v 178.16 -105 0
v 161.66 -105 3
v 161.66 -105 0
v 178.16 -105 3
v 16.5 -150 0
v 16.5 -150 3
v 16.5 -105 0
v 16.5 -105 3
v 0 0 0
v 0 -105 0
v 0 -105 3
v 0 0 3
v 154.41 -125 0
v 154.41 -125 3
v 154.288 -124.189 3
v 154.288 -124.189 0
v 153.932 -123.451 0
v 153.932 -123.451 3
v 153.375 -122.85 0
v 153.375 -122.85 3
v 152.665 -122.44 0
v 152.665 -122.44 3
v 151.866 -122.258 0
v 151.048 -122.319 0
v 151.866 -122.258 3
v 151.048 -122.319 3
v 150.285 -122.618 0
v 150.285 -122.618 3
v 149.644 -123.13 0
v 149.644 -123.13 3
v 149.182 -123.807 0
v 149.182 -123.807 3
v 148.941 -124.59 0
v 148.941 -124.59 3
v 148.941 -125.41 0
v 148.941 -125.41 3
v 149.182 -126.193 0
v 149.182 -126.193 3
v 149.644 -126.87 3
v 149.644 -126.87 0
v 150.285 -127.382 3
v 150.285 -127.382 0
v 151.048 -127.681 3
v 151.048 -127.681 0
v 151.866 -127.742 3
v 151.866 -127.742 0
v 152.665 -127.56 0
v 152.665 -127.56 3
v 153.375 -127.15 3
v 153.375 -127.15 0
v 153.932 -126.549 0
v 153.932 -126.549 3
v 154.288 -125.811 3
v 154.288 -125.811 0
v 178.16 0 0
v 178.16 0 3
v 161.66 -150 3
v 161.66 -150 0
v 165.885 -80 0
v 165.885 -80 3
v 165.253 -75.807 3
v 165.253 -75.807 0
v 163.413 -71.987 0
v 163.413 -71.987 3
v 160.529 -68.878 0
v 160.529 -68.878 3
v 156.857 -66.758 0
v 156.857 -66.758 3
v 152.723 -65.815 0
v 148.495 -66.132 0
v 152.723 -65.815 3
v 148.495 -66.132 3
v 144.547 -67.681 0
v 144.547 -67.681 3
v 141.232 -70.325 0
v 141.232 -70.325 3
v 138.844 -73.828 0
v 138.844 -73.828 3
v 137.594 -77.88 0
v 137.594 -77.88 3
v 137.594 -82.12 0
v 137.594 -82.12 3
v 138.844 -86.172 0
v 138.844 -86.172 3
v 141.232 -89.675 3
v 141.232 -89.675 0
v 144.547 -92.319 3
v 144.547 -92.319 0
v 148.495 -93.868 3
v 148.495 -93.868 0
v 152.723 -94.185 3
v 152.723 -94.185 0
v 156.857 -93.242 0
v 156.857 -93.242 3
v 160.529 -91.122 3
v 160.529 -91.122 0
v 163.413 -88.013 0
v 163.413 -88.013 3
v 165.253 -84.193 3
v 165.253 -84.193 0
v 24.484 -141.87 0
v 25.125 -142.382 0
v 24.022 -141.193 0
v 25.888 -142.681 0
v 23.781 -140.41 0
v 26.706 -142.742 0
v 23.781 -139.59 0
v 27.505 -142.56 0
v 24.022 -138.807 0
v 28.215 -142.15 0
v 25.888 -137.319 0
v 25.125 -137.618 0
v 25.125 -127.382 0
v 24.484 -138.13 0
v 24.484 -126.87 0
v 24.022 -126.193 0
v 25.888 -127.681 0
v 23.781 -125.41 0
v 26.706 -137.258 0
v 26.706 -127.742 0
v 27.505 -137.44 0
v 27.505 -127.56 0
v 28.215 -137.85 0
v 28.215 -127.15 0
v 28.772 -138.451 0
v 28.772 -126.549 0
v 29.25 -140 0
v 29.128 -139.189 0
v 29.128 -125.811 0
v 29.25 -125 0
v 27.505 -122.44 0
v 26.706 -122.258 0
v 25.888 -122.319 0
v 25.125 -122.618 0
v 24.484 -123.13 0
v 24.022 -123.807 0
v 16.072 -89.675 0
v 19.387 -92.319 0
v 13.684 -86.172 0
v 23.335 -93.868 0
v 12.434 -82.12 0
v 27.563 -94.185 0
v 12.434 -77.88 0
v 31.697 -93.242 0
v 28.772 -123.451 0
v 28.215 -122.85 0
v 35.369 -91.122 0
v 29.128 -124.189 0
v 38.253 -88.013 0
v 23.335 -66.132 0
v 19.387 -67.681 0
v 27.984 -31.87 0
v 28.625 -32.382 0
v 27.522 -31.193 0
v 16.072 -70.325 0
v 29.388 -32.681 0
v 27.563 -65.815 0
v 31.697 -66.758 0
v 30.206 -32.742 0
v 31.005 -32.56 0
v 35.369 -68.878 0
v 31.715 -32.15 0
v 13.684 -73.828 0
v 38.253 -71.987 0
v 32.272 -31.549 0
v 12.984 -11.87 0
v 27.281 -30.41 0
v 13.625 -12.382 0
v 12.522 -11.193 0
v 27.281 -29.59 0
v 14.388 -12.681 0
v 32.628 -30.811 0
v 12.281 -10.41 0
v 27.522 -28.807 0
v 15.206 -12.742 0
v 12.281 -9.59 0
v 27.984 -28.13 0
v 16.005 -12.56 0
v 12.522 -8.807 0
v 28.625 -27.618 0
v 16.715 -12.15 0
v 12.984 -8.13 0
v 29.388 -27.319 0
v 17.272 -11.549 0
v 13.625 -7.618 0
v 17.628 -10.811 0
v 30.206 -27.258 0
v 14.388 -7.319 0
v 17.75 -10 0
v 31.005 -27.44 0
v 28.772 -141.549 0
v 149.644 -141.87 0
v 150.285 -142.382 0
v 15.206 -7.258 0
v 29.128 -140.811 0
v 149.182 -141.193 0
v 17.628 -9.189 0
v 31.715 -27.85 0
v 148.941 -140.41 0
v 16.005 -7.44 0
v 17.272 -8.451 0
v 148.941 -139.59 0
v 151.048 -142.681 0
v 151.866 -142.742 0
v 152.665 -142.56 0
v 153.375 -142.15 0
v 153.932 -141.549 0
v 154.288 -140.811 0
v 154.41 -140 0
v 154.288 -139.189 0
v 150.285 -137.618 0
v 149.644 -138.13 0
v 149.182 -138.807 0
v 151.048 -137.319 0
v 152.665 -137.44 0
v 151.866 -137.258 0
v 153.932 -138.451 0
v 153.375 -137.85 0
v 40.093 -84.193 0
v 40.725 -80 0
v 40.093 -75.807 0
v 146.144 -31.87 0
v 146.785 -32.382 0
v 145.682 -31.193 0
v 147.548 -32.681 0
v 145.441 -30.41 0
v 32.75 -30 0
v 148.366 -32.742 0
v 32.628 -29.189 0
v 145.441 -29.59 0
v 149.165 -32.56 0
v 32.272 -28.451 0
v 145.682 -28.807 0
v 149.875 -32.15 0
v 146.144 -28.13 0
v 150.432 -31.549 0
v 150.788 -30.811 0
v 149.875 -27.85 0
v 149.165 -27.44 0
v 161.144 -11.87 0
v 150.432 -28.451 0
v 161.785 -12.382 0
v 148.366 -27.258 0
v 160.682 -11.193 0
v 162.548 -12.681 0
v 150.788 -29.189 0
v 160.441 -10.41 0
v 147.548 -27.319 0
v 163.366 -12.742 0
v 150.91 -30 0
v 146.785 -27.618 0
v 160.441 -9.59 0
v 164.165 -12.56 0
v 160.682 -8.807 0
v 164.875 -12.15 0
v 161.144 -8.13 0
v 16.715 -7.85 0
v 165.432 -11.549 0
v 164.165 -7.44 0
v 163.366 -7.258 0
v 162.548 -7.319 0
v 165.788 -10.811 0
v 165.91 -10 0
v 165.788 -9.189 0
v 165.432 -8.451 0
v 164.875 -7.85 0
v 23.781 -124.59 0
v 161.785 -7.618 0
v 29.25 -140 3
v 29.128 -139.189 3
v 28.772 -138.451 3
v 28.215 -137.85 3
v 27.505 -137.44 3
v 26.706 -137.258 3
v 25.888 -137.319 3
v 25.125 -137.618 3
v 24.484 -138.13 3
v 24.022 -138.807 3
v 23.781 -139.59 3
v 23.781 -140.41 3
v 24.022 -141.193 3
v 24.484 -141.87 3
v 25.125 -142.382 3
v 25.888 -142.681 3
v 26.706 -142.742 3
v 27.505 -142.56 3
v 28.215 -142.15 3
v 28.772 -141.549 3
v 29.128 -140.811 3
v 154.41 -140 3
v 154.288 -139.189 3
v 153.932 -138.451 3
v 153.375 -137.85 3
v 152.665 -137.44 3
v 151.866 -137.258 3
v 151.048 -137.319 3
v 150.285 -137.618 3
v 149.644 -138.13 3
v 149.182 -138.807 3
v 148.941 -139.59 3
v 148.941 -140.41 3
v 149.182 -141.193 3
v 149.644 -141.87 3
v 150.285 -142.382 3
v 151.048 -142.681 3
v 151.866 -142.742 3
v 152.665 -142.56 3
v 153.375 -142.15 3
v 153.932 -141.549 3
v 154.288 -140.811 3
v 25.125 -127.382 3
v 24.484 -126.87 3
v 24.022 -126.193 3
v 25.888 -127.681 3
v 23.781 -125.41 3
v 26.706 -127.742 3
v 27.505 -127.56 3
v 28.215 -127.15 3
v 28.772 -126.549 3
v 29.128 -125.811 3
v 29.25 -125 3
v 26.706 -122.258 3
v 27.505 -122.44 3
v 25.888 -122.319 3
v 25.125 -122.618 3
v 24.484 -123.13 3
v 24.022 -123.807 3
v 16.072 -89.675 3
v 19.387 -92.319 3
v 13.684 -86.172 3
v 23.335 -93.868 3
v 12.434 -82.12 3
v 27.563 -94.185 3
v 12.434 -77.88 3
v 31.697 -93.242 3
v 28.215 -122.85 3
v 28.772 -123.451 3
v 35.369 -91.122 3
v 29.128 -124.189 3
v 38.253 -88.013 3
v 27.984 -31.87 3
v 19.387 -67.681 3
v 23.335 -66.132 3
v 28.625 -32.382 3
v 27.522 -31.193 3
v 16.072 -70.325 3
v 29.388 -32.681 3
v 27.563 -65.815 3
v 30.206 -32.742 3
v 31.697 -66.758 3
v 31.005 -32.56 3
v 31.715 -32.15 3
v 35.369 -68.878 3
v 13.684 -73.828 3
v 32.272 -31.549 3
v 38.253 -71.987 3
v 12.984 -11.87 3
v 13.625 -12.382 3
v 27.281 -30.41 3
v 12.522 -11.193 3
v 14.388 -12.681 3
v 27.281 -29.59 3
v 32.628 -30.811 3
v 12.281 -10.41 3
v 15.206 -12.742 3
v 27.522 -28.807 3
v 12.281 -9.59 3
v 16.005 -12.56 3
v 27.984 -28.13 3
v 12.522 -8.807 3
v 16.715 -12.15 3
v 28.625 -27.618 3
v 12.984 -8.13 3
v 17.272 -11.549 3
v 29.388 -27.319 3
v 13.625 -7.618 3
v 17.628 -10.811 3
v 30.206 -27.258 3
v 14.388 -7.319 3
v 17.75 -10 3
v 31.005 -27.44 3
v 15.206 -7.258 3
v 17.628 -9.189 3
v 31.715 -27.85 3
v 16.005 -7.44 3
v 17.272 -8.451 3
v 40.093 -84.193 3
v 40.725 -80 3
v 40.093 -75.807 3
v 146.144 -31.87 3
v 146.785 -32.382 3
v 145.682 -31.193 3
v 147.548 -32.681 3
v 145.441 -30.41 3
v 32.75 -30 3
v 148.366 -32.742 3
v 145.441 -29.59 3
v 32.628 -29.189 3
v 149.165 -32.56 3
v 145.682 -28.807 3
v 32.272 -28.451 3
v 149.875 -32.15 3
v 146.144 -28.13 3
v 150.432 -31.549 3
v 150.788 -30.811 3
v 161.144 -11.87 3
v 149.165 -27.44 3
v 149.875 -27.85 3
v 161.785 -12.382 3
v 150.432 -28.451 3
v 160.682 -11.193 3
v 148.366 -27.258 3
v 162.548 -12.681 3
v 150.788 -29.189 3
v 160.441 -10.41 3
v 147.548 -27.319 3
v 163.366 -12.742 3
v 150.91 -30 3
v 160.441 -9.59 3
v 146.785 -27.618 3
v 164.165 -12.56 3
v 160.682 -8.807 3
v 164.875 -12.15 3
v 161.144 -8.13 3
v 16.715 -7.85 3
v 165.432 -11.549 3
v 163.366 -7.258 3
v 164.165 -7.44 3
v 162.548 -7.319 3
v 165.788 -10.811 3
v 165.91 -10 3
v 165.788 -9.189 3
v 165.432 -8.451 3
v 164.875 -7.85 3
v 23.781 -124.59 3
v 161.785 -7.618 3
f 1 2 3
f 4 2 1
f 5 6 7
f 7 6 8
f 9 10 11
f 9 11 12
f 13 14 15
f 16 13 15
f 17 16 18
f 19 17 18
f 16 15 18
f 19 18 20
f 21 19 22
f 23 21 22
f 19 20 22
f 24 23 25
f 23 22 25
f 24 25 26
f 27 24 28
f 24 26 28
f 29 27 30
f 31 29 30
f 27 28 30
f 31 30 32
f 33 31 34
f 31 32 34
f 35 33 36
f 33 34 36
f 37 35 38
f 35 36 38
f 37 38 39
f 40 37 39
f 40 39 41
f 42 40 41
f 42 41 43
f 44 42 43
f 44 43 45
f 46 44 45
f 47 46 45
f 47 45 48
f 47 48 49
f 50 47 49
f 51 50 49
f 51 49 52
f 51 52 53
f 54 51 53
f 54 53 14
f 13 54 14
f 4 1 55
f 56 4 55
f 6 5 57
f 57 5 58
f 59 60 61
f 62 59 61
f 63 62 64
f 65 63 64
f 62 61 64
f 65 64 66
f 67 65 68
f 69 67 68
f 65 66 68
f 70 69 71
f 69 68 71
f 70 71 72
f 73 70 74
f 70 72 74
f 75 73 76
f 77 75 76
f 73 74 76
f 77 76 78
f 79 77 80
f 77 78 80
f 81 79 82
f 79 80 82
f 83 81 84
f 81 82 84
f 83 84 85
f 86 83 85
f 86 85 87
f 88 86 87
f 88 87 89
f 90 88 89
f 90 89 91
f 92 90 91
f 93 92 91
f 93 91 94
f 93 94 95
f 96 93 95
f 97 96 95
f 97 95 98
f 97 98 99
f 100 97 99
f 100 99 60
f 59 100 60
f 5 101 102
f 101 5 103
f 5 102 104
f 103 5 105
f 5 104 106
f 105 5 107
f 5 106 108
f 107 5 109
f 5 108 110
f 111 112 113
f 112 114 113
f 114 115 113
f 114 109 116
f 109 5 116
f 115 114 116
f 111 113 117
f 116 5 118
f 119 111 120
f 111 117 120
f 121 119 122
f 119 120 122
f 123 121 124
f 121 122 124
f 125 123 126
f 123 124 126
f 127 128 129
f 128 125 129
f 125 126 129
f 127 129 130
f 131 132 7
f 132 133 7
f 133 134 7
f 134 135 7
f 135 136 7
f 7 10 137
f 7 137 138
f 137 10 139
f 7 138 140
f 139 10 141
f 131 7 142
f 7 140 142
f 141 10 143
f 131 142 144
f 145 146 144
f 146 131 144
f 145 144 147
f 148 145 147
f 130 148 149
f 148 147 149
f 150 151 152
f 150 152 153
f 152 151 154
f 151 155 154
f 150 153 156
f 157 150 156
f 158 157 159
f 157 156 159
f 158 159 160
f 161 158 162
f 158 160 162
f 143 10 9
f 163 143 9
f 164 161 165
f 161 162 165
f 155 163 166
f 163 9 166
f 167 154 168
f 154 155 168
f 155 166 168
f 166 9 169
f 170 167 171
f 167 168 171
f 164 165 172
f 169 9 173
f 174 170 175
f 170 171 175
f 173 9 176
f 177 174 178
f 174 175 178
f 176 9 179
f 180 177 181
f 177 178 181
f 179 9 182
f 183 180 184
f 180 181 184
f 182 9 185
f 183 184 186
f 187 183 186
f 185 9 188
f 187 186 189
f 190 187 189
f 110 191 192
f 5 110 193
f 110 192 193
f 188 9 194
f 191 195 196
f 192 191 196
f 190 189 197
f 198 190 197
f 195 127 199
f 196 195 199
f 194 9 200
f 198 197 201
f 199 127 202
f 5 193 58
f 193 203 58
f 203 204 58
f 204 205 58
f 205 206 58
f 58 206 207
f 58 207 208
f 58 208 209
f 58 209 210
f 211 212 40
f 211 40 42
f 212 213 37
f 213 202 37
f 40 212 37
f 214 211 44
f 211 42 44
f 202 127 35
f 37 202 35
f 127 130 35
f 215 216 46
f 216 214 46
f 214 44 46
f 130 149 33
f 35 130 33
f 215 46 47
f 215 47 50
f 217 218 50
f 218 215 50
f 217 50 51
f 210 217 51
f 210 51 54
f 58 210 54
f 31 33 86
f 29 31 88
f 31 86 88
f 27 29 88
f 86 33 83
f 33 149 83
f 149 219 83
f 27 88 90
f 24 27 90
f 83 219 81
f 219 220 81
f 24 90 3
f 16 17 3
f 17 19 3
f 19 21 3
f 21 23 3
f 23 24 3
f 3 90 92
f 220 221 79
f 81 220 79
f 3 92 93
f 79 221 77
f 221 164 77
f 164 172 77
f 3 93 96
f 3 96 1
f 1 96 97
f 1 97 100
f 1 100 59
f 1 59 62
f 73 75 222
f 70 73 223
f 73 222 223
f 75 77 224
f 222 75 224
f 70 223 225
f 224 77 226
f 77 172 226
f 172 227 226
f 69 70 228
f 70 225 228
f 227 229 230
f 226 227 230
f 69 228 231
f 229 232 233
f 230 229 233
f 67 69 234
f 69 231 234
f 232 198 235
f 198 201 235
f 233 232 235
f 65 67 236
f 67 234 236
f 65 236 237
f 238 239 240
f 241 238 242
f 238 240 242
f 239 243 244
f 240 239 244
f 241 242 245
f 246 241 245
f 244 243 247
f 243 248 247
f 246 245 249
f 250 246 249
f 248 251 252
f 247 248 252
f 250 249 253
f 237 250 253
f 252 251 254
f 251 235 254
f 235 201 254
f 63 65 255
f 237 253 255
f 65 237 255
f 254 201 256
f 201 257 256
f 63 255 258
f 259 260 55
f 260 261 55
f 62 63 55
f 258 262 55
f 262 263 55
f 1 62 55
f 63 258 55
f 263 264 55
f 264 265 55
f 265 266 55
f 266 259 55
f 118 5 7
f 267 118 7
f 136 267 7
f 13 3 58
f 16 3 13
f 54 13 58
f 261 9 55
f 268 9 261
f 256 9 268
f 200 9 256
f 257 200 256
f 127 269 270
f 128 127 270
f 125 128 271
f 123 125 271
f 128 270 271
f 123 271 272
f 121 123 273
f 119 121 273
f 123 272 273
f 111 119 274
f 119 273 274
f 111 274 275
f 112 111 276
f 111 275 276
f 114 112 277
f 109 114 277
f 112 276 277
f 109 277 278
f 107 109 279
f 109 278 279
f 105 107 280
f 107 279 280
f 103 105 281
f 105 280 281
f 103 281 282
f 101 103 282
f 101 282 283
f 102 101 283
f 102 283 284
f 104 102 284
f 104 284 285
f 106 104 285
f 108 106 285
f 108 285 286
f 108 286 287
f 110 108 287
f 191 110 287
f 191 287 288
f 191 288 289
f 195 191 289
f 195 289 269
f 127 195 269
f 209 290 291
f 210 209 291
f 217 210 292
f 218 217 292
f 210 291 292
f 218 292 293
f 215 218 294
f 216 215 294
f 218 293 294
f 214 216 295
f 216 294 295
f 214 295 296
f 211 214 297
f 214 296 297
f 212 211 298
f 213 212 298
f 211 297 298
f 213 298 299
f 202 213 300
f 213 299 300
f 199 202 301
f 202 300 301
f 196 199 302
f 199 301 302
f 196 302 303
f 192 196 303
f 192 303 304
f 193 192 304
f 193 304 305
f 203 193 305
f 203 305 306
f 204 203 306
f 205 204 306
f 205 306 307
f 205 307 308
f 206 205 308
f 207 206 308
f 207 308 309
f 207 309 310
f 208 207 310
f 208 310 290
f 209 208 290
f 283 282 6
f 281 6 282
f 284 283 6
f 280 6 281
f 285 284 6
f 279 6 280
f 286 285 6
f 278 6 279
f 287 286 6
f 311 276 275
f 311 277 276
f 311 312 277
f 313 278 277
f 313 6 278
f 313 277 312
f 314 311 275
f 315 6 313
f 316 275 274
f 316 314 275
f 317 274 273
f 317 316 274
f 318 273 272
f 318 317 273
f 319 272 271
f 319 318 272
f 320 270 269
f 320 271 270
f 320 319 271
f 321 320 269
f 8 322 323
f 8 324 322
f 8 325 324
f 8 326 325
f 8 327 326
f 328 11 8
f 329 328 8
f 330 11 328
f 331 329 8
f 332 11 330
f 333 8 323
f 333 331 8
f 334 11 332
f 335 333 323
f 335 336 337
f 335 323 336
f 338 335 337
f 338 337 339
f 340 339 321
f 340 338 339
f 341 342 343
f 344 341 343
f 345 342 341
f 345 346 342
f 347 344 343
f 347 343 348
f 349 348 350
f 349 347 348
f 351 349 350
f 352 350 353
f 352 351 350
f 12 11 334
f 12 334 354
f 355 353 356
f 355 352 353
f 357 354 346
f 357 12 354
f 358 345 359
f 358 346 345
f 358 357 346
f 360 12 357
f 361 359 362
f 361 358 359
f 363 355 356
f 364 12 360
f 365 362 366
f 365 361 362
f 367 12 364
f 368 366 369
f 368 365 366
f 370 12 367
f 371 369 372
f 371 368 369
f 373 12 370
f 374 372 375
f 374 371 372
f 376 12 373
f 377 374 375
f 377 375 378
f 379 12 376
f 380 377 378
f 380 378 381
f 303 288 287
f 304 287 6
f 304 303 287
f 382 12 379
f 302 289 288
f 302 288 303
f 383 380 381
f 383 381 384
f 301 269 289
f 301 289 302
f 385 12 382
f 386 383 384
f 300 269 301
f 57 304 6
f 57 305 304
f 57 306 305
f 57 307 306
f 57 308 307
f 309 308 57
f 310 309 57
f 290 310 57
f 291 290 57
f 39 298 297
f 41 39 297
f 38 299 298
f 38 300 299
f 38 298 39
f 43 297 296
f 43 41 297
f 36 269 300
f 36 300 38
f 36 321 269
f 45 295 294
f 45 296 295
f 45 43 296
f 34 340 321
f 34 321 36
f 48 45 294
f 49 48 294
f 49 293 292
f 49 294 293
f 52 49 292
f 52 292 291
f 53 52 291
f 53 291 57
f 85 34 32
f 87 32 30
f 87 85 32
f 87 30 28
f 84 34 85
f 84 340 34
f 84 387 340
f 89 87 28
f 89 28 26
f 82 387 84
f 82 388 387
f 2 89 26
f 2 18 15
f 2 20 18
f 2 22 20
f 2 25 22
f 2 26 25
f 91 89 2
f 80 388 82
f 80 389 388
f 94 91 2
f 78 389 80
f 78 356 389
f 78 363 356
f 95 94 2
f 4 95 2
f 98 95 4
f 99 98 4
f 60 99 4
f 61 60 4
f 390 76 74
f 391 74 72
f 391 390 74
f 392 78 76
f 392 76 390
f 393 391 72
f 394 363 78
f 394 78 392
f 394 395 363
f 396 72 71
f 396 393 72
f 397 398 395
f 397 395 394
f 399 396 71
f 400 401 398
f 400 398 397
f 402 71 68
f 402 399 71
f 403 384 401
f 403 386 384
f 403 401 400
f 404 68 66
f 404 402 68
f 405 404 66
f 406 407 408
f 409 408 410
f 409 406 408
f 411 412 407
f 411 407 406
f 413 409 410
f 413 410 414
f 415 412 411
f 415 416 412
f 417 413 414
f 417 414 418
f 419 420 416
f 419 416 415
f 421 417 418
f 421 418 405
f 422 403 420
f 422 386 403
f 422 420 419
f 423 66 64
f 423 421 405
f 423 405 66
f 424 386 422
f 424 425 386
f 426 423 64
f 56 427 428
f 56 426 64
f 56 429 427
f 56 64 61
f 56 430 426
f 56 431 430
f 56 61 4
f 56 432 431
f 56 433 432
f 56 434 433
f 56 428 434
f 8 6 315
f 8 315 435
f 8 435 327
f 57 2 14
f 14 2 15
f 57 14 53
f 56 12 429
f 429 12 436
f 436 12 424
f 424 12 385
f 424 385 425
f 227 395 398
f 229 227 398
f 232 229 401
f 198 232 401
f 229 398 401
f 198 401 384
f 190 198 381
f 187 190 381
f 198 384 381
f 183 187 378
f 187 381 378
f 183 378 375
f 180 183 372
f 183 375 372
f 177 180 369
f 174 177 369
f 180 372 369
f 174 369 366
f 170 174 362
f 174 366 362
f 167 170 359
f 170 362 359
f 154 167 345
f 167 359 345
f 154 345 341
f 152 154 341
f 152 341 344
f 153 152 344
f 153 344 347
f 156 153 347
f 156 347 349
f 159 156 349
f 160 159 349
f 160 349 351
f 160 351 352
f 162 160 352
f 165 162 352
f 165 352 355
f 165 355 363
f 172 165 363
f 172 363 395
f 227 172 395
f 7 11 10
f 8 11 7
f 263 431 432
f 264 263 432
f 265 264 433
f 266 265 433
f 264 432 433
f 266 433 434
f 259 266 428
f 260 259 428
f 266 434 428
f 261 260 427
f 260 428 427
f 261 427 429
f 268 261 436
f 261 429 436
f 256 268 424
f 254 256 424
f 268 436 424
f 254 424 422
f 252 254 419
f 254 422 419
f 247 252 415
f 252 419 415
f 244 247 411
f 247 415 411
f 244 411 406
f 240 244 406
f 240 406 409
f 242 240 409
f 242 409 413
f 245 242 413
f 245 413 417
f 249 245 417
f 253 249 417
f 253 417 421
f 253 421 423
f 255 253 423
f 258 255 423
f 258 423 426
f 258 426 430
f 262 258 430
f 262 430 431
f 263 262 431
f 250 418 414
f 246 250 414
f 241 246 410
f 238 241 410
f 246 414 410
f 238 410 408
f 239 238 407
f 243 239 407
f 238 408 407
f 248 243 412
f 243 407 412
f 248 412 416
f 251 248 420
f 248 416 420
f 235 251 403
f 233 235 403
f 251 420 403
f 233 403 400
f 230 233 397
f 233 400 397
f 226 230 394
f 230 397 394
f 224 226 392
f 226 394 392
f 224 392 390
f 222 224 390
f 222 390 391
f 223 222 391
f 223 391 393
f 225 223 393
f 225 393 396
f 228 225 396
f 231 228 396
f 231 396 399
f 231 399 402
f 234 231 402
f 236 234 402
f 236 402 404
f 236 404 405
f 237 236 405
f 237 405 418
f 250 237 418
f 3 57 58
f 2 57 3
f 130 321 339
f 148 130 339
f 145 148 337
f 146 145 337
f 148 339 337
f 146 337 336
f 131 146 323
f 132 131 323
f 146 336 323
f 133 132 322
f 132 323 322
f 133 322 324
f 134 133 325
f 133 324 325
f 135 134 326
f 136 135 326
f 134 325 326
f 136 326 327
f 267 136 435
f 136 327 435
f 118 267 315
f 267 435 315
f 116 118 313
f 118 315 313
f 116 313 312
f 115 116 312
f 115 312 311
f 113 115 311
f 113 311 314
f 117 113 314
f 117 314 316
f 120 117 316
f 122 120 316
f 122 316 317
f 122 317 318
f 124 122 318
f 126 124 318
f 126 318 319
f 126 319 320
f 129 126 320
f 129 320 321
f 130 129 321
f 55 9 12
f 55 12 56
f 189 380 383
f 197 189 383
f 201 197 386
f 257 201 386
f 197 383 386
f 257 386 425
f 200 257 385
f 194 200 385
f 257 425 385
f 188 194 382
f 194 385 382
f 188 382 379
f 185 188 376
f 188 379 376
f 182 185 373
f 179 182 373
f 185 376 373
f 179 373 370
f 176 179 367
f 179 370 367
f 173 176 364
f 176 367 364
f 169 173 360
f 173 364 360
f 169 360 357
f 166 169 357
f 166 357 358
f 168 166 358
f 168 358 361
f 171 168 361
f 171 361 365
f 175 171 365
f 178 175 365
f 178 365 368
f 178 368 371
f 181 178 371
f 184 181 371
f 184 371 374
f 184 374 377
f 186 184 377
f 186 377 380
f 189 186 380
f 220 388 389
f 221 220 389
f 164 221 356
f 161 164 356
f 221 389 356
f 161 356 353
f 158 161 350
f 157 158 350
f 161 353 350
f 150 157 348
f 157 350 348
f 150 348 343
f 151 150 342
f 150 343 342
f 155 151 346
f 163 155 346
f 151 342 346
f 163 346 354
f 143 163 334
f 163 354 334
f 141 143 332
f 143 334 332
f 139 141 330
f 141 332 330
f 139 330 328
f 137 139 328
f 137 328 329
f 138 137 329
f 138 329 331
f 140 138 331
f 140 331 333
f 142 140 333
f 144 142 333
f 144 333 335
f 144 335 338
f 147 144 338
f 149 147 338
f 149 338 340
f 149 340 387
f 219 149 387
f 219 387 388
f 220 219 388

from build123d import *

# Parameters (mm, degrees)
SKETCH1_W           = 178.16
SKETCH1_H           = 150
BOSS_EXTRUDE1_DEPTH = 3
SKETCH2_R           = 14.225
SKETCH2_R_2         = 2.75
CUT_EXTRUDE1_DEPTH  = 4
SKETCH4_W           = 16.5
SKETCH4_H           = 45
CUT_EXTRUDE3_DEPTH  = 4
SKETCH5_R           = 2.75
CUT_EXTRUDE4_DEPTH  = 4


with BuildPart() as part:
    # Sketch1 → Boss-Extrude1 (new body)
    with BuildSketch(Plane.XY):
        with Locations((89.08, -75)):
            Rectangle(SKETCH1_W, SKETCH1_H)
    extrude(amount=BOSS_EXTRUDE1_DEPTH)

    # Sketch2 → Cut-Extrude1 (cut, through all)
    with BuildSketch(Plane.XY.offset(3)):
        with Locations((26.5, -80)):
            Circle(SKETCH2_R)
        with Locations((151.66, -80)):
            Circle(SKETCH2_R)
        with Locations((26.5, -140)):
            Circle(SKETCH2_R_2)
        with Locations((151.66, -140)):
            Circle(SKETCH2_R_2)
        with Locations((26.5, -125)):
            Circle(SKETCH2_R_2)
        with Locations((151.66, -125)):
            Circle(SKETCH2_R_2)
    extrude(amount=-CUT_EXTRUDE1_DEPTH, mode=Mode.SUBTRACT)

    # Sketch4 → Cut-Extrude3 (cut, through all)
    with BuildSketch(Plane.XY.offset(3)):
        with Locations((8.25, -127.5)):
            Rectangle(SKETCH4_W, SKETCH4_H)
        with Locations((169.91, -127.5)):
            Rectangle(SKETCH4_W, SKETCH4_H)
    extrude(amount=-CUT_EXTRUDE3_DEPTH, mode=Mode.SUBTRACT)

    # Sketch5 → Cut-Extrude4 (cut, through all)
    with BuildSketch(Plane.XY.offset(3)):
        with Locations((163.16, -10)):
            Circle(SKETCH5_R)
        with Locations((15, -10)):
            Circle(SKETCH5_R)
        with Locations((148.16, -30)):
            Circle(SKETCH5_R)
        with Locations((30, -30)):
            Circle(SKETCH5_R)
    extrude(amount=-CUT_EXTRUDE4_DEPTH, mode=Mode.SUBTRACT)


solid = part.part
